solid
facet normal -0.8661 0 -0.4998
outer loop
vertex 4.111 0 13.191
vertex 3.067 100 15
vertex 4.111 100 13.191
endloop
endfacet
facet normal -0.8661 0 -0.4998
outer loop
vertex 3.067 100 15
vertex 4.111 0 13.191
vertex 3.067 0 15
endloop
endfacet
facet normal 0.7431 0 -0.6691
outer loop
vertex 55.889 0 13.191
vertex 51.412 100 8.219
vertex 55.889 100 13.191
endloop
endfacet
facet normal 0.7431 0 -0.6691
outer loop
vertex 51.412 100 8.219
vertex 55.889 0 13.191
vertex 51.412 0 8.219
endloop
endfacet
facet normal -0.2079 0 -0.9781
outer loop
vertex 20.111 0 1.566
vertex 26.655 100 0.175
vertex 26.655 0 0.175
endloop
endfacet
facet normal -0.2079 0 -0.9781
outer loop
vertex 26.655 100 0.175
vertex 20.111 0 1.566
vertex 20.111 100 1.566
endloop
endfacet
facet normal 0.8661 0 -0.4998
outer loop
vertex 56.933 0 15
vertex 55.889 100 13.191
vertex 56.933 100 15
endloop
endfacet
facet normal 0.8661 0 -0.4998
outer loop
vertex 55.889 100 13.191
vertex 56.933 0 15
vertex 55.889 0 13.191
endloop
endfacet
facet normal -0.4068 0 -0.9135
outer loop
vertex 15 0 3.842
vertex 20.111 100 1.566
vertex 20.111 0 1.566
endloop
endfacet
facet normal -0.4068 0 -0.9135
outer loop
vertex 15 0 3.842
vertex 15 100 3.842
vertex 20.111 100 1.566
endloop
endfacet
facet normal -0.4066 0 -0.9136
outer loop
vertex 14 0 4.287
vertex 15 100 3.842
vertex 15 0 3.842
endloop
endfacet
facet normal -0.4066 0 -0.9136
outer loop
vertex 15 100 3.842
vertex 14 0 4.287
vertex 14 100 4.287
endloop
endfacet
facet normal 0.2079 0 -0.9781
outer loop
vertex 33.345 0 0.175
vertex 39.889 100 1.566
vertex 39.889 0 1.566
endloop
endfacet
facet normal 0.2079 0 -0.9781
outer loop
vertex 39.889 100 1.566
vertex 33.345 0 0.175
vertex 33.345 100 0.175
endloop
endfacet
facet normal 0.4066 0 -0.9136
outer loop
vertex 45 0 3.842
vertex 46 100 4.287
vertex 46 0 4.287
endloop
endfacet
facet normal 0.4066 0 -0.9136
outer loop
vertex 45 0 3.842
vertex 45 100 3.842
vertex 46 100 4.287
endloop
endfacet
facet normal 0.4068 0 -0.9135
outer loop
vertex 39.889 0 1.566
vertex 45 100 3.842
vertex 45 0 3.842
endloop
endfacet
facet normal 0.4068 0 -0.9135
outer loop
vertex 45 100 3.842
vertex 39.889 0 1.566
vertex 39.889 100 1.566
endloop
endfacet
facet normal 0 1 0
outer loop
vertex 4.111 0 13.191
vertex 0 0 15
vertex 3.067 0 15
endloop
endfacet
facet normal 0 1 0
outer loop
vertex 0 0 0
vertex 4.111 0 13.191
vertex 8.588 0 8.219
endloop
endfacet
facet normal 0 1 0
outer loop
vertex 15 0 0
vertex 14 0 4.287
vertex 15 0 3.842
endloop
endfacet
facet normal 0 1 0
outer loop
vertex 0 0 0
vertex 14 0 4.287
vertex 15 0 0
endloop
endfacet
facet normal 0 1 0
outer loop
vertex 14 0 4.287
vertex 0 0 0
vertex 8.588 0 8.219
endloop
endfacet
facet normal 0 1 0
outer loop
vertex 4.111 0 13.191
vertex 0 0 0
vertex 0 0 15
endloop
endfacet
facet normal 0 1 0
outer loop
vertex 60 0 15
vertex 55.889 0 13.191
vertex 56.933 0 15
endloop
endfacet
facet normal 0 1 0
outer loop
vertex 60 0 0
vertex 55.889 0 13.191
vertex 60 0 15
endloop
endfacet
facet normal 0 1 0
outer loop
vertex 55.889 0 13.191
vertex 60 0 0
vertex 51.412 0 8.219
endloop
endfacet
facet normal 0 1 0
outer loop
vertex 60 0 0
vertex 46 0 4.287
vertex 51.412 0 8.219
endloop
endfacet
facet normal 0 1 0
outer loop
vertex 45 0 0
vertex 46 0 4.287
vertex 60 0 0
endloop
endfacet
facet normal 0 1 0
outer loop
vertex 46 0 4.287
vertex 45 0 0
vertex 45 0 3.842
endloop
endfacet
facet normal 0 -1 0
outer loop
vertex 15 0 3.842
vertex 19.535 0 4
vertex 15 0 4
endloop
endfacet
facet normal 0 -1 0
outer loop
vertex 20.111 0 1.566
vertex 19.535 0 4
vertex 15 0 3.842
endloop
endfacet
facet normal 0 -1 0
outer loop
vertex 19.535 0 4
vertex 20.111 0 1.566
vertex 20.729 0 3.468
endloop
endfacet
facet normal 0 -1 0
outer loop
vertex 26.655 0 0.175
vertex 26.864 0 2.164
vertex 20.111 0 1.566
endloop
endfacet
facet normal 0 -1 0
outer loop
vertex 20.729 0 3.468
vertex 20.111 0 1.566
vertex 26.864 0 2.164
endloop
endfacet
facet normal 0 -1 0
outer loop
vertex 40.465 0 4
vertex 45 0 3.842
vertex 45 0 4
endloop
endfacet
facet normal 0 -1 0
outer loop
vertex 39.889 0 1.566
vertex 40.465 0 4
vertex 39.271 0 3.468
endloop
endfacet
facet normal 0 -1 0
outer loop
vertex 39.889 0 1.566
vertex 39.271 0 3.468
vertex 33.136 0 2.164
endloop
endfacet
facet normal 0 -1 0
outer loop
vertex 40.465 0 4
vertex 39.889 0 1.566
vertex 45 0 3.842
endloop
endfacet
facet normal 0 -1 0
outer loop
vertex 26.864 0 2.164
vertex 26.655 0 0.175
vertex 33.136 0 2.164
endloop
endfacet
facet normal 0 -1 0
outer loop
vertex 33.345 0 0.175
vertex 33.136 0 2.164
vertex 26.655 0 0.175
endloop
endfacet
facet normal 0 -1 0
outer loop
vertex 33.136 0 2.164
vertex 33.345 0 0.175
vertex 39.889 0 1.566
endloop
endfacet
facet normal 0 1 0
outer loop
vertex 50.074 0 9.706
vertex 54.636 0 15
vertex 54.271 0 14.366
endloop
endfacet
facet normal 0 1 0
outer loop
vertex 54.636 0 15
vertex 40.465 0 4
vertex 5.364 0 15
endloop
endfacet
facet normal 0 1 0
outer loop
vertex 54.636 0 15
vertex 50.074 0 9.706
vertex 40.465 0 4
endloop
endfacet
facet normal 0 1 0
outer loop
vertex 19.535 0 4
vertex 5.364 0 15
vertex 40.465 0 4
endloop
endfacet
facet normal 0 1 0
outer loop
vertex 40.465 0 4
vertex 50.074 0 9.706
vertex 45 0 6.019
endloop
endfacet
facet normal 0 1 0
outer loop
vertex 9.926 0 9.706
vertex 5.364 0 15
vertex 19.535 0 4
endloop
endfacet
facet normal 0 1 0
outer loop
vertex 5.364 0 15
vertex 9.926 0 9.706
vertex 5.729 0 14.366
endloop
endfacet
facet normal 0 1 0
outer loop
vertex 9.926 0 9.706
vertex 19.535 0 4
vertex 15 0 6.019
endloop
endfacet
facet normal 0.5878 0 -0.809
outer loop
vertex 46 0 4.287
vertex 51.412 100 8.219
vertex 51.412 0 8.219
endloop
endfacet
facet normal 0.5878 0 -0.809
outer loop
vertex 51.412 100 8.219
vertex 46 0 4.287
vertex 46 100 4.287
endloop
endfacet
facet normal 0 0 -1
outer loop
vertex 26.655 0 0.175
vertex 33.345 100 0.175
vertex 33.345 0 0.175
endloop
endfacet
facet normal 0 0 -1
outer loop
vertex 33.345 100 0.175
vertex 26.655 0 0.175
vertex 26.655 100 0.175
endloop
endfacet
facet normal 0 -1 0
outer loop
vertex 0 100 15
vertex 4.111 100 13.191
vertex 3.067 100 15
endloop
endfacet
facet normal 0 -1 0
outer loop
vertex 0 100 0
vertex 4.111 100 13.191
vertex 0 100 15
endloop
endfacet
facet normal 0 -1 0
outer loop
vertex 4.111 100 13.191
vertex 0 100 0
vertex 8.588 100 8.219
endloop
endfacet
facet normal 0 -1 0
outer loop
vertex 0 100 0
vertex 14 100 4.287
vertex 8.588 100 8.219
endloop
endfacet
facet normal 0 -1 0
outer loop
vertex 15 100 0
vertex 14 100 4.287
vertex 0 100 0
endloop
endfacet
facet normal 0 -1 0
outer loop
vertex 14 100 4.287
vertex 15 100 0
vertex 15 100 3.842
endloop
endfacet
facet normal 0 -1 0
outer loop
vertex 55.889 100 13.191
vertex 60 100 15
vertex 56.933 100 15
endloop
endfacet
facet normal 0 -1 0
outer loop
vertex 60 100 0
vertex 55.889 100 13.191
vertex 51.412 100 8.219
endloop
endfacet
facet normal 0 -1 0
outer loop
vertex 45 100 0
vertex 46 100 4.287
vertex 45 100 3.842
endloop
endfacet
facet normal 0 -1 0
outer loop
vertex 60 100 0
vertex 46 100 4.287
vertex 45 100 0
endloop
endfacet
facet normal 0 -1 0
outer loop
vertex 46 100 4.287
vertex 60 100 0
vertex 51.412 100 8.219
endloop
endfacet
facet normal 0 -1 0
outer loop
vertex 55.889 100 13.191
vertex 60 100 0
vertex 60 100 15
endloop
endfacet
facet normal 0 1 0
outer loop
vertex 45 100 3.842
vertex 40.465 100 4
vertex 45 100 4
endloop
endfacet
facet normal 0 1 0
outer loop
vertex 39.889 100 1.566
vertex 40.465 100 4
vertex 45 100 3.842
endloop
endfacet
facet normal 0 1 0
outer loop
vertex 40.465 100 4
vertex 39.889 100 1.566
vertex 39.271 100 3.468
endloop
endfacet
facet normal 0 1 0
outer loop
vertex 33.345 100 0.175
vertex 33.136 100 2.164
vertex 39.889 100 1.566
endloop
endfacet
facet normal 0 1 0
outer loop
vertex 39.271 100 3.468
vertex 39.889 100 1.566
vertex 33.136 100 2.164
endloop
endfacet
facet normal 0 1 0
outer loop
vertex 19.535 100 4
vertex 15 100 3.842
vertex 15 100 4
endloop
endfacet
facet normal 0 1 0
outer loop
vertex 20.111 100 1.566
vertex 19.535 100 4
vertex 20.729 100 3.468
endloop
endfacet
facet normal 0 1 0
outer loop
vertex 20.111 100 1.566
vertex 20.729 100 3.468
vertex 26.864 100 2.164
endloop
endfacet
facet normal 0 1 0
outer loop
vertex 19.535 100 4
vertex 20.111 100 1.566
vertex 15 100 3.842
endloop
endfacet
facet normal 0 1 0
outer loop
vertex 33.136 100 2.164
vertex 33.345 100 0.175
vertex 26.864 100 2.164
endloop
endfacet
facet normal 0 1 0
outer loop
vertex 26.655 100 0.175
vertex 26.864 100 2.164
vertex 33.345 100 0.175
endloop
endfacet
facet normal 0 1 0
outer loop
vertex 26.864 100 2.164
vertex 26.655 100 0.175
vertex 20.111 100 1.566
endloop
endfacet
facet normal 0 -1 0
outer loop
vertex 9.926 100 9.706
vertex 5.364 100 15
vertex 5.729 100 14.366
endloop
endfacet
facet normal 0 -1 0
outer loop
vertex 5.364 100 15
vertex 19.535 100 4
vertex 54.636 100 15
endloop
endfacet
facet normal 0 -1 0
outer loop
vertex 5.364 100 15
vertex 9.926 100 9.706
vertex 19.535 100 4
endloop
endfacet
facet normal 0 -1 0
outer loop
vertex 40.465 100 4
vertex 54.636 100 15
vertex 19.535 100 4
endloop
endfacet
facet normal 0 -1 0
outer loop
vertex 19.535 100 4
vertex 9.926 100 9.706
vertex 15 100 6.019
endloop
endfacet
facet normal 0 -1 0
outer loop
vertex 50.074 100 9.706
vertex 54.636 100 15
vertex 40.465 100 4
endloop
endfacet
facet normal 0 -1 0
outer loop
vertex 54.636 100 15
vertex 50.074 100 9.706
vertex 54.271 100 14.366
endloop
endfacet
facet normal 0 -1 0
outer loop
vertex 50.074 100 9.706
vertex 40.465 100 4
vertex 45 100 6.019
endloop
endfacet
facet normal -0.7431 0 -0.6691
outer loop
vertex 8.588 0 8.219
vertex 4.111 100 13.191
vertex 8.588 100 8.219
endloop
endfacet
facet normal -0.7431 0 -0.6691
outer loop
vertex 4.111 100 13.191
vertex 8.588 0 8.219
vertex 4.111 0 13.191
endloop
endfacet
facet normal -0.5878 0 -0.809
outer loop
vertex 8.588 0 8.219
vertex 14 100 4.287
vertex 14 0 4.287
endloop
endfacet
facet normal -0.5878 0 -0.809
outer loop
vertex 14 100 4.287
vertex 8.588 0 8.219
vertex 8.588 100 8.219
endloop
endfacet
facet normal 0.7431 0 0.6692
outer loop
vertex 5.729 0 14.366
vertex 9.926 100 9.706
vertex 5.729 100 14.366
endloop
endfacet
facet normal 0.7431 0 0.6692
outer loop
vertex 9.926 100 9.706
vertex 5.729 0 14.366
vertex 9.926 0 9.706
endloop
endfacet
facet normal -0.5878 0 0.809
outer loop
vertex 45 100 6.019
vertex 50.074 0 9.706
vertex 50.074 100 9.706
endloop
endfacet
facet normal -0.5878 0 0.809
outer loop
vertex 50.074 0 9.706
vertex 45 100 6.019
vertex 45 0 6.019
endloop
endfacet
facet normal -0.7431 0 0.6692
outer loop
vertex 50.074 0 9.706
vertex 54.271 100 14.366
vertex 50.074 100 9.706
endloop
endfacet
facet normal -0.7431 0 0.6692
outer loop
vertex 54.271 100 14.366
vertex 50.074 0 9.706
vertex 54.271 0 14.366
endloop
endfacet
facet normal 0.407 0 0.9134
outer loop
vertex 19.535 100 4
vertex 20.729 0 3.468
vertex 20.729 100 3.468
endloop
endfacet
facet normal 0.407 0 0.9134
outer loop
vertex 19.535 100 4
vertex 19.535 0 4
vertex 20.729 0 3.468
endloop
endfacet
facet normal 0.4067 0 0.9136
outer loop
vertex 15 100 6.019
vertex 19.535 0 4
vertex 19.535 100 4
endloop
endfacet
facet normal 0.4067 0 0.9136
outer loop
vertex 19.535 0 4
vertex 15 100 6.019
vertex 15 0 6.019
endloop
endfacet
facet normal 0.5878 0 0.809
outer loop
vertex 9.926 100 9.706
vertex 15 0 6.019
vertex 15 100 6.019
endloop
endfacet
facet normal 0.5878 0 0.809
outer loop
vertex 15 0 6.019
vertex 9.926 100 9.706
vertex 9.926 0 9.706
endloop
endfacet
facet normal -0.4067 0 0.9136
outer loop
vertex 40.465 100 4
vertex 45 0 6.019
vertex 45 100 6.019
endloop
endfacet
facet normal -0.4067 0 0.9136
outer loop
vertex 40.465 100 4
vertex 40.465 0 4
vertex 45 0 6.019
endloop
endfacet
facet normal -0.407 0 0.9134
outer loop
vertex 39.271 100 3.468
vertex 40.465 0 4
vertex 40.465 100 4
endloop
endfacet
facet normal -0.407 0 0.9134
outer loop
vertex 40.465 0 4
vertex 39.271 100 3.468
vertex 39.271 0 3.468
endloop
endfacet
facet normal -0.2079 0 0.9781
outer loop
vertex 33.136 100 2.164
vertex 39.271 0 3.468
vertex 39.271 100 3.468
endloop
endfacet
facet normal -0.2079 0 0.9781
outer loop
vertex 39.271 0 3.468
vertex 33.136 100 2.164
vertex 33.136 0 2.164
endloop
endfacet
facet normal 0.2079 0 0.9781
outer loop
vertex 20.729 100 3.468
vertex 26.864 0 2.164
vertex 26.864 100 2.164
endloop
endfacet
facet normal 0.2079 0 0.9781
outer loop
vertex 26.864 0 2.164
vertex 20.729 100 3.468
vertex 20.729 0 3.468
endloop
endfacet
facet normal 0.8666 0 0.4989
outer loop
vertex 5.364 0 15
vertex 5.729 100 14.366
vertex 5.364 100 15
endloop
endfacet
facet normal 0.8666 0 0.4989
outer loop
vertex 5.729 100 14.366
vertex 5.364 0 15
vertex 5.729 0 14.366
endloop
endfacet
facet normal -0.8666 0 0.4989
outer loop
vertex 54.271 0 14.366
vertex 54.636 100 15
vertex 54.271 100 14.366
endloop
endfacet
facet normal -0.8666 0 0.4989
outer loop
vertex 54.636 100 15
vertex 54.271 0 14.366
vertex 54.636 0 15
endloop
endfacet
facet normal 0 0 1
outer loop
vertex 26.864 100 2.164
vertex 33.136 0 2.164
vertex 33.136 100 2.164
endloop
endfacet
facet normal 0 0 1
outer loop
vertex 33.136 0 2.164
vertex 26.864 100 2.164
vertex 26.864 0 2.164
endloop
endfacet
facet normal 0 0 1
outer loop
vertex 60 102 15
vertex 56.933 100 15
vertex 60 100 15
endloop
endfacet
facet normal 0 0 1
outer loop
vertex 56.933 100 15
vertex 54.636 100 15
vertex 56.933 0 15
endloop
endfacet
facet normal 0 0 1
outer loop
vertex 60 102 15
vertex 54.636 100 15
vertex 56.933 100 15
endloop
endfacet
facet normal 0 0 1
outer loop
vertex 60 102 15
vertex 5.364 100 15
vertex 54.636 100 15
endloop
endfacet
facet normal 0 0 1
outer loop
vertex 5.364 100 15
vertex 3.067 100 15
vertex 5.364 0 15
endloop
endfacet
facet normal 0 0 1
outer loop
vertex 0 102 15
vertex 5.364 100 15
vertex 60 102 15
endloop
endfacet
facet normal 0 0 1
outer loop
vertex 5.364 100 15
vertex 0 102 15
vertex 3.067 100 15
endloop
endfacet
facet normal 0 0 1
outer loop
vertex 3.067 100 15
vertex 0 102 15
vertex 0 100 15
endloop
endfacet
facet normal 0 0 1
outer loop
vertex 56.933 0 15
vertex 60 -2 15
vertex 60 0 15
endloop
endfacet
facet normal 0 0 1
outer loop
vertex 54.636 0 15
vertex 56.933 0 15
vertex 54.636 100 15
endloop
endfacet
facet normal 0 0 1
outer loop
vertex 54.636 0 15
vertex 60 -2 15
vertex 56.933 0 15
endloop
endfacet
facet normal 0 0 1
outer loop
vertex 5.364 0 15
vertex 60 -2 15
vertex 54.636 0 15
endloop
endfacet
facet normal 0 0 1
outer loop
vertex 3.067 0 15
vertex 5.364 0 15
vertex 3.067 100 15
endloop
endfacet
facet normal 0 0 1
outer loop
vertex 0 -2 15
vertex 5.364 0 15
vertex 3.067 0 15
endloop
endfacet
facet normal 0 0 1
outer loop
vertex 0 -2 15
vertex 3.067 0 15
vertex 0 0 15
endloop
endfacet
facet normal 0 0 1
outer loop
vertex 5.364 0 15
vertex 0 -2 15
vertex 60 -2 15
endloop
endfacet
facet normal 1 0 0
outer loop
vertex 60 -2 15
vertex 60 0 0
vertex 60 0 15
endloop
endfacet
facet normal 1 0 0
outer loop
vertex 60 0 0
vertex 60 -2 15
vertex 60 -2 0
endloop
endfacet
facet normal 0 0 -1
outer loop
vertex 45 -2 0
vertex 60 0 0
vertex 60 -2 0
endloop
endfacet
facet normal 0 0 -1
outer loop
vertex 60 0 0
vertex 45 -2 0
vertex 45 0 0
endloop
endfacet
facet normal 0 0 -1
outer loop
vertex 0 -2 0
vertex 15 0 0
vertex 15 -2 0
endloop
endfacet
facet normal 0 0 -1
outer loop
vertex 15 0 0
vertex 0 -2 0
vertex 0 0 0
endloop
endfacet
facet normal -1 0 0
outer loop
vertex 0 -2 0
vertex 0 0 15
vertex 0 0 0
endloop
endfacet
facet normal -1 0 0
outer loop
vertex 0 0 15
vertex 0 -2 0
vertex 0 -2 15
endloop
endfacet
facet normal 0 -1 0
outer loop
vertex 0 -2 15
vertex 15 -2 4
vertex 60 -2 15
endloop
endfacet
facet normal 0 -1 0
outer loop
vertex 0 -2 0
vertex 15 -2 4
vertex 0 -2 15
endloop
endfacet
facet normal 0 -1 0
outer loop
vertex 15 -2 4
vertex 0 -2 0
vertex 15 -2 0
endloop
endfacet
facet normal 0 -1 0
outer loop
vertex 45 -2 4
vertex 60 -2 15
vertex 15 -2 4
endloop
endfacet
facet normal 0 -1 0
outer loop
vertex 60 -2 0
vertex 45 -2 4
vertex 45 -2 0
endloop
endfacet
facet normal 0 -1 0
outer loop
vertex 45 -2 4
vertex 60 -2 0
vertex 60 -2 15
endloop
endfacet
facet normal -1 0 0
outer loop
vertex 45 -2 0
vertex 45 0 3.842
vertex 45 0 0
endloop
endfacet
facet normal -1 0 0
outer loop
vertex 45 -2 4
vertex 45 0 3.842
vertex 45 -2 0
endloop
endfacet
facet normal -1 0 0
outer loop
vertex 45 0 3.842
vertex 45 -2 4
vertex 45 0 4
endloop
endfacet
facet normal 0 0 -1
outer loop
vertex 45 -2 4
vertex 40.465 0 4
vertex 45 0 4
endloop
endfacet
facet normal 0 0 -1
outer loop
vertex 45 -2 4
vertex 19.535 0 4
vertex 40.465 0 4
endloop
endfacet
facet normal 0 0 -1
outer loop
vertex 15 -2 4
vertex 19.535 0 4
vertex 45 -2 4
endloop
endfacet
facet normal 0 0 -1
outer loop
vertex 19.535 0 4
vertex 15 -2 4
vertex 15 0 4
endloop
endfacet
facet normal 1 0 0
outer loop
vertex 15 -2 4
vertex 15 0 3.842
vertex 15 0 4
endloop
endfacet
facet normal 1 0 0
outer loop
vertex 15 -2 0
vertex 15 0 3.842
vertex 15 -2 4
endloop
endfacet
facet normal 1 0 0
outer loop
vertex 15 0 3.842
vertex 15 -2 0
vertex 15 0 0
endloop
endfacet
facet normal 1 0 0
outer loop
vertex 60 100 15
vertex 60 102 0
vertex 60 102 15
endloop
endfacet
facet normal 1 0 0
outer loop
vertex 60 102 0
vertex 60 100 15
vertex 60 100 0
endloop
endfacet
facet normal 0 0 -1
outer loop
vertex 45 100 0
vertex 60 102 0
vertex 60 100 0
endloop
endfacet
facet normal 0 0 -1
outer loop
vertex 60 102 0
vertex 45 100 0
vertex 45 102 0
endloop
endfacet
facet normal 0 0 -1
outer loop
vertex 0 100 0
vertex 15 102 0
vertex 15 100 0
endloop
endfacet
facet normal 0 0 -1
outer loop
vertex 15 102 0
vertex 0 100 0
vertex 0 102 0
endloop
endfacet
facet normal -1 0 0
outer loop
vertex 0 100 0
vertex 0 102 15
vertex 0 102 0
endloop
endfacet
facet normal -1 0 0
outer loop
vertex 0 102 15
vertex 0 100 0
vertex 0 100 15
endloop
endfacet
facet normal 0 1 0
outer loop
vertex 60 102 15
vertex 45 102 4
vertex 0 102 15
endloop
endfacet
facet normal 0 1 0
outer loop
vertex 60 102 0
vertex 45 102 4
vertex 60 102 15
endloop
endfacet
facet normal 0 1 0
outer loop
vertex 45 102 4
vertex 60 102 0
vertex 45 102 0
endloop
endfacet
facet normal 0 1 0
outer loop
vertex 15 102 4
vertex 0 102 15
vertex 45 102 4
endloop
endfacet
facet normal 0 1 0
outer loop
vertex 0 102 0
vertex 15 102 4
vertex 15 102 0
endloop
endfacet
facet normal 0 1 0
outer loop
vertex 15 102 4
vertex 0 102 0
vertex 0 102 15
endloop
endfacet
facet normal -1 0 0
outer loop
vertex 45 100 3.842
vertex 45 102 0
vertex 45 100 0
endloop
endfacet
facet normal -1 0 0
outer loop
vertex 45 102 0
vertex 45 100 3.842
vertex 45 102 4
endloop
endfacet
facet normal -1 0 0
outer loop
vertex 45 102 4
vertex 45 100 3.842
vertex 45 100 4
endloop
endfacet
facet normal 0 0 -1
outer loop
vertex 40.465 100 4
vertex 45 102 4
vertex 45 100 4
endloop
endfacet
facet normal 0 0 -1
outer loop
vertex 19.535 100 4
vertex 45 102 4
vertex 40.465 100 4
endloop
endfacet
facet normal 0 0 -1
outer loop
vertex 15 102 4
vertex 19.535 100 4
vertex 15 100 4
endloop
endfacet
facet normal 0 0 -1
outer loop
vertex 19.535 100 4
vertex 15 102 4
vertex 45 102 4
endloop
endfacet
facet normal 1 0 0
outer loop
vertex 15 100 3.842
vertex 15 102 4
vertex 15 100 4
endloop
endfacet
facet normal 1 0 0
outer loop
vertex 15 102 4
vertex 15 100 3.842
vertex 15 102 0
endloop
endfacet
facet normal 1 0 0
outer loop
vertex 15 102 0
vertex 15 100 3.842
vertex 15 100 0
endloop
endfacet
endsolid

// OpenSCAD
Width = 60;
Length = 100;
Wall = 2;
Height = 15;

// make a curved bottom part
intersection() {
    cube([Width, Length, Height]);
    translate([Width/2,Length,Width/2+Wall]) {
        rotate([90,0,0]) {
            difference() {
                cylinder(r=Width/2+Wall, h=Length);
                cylinder(r=Width/2, h=Length);
            }
        }
    }
}

// Now put on end plates
translate([0,-1*Wall,0]) {
    difference() {
        cube([Width,Wall,Height]);
        translate([Width/4,0,0]) {
          cube([Width/2,Wall,Wall*2]);
        }
    }
}
translate([0,Length,0]) {
    difference() {
        cube([Width,Wall,Height]);
        translate([Width/4,0,0]) {
          cube([Width/2,Wall,Wall*2]);
        }
    }
}
